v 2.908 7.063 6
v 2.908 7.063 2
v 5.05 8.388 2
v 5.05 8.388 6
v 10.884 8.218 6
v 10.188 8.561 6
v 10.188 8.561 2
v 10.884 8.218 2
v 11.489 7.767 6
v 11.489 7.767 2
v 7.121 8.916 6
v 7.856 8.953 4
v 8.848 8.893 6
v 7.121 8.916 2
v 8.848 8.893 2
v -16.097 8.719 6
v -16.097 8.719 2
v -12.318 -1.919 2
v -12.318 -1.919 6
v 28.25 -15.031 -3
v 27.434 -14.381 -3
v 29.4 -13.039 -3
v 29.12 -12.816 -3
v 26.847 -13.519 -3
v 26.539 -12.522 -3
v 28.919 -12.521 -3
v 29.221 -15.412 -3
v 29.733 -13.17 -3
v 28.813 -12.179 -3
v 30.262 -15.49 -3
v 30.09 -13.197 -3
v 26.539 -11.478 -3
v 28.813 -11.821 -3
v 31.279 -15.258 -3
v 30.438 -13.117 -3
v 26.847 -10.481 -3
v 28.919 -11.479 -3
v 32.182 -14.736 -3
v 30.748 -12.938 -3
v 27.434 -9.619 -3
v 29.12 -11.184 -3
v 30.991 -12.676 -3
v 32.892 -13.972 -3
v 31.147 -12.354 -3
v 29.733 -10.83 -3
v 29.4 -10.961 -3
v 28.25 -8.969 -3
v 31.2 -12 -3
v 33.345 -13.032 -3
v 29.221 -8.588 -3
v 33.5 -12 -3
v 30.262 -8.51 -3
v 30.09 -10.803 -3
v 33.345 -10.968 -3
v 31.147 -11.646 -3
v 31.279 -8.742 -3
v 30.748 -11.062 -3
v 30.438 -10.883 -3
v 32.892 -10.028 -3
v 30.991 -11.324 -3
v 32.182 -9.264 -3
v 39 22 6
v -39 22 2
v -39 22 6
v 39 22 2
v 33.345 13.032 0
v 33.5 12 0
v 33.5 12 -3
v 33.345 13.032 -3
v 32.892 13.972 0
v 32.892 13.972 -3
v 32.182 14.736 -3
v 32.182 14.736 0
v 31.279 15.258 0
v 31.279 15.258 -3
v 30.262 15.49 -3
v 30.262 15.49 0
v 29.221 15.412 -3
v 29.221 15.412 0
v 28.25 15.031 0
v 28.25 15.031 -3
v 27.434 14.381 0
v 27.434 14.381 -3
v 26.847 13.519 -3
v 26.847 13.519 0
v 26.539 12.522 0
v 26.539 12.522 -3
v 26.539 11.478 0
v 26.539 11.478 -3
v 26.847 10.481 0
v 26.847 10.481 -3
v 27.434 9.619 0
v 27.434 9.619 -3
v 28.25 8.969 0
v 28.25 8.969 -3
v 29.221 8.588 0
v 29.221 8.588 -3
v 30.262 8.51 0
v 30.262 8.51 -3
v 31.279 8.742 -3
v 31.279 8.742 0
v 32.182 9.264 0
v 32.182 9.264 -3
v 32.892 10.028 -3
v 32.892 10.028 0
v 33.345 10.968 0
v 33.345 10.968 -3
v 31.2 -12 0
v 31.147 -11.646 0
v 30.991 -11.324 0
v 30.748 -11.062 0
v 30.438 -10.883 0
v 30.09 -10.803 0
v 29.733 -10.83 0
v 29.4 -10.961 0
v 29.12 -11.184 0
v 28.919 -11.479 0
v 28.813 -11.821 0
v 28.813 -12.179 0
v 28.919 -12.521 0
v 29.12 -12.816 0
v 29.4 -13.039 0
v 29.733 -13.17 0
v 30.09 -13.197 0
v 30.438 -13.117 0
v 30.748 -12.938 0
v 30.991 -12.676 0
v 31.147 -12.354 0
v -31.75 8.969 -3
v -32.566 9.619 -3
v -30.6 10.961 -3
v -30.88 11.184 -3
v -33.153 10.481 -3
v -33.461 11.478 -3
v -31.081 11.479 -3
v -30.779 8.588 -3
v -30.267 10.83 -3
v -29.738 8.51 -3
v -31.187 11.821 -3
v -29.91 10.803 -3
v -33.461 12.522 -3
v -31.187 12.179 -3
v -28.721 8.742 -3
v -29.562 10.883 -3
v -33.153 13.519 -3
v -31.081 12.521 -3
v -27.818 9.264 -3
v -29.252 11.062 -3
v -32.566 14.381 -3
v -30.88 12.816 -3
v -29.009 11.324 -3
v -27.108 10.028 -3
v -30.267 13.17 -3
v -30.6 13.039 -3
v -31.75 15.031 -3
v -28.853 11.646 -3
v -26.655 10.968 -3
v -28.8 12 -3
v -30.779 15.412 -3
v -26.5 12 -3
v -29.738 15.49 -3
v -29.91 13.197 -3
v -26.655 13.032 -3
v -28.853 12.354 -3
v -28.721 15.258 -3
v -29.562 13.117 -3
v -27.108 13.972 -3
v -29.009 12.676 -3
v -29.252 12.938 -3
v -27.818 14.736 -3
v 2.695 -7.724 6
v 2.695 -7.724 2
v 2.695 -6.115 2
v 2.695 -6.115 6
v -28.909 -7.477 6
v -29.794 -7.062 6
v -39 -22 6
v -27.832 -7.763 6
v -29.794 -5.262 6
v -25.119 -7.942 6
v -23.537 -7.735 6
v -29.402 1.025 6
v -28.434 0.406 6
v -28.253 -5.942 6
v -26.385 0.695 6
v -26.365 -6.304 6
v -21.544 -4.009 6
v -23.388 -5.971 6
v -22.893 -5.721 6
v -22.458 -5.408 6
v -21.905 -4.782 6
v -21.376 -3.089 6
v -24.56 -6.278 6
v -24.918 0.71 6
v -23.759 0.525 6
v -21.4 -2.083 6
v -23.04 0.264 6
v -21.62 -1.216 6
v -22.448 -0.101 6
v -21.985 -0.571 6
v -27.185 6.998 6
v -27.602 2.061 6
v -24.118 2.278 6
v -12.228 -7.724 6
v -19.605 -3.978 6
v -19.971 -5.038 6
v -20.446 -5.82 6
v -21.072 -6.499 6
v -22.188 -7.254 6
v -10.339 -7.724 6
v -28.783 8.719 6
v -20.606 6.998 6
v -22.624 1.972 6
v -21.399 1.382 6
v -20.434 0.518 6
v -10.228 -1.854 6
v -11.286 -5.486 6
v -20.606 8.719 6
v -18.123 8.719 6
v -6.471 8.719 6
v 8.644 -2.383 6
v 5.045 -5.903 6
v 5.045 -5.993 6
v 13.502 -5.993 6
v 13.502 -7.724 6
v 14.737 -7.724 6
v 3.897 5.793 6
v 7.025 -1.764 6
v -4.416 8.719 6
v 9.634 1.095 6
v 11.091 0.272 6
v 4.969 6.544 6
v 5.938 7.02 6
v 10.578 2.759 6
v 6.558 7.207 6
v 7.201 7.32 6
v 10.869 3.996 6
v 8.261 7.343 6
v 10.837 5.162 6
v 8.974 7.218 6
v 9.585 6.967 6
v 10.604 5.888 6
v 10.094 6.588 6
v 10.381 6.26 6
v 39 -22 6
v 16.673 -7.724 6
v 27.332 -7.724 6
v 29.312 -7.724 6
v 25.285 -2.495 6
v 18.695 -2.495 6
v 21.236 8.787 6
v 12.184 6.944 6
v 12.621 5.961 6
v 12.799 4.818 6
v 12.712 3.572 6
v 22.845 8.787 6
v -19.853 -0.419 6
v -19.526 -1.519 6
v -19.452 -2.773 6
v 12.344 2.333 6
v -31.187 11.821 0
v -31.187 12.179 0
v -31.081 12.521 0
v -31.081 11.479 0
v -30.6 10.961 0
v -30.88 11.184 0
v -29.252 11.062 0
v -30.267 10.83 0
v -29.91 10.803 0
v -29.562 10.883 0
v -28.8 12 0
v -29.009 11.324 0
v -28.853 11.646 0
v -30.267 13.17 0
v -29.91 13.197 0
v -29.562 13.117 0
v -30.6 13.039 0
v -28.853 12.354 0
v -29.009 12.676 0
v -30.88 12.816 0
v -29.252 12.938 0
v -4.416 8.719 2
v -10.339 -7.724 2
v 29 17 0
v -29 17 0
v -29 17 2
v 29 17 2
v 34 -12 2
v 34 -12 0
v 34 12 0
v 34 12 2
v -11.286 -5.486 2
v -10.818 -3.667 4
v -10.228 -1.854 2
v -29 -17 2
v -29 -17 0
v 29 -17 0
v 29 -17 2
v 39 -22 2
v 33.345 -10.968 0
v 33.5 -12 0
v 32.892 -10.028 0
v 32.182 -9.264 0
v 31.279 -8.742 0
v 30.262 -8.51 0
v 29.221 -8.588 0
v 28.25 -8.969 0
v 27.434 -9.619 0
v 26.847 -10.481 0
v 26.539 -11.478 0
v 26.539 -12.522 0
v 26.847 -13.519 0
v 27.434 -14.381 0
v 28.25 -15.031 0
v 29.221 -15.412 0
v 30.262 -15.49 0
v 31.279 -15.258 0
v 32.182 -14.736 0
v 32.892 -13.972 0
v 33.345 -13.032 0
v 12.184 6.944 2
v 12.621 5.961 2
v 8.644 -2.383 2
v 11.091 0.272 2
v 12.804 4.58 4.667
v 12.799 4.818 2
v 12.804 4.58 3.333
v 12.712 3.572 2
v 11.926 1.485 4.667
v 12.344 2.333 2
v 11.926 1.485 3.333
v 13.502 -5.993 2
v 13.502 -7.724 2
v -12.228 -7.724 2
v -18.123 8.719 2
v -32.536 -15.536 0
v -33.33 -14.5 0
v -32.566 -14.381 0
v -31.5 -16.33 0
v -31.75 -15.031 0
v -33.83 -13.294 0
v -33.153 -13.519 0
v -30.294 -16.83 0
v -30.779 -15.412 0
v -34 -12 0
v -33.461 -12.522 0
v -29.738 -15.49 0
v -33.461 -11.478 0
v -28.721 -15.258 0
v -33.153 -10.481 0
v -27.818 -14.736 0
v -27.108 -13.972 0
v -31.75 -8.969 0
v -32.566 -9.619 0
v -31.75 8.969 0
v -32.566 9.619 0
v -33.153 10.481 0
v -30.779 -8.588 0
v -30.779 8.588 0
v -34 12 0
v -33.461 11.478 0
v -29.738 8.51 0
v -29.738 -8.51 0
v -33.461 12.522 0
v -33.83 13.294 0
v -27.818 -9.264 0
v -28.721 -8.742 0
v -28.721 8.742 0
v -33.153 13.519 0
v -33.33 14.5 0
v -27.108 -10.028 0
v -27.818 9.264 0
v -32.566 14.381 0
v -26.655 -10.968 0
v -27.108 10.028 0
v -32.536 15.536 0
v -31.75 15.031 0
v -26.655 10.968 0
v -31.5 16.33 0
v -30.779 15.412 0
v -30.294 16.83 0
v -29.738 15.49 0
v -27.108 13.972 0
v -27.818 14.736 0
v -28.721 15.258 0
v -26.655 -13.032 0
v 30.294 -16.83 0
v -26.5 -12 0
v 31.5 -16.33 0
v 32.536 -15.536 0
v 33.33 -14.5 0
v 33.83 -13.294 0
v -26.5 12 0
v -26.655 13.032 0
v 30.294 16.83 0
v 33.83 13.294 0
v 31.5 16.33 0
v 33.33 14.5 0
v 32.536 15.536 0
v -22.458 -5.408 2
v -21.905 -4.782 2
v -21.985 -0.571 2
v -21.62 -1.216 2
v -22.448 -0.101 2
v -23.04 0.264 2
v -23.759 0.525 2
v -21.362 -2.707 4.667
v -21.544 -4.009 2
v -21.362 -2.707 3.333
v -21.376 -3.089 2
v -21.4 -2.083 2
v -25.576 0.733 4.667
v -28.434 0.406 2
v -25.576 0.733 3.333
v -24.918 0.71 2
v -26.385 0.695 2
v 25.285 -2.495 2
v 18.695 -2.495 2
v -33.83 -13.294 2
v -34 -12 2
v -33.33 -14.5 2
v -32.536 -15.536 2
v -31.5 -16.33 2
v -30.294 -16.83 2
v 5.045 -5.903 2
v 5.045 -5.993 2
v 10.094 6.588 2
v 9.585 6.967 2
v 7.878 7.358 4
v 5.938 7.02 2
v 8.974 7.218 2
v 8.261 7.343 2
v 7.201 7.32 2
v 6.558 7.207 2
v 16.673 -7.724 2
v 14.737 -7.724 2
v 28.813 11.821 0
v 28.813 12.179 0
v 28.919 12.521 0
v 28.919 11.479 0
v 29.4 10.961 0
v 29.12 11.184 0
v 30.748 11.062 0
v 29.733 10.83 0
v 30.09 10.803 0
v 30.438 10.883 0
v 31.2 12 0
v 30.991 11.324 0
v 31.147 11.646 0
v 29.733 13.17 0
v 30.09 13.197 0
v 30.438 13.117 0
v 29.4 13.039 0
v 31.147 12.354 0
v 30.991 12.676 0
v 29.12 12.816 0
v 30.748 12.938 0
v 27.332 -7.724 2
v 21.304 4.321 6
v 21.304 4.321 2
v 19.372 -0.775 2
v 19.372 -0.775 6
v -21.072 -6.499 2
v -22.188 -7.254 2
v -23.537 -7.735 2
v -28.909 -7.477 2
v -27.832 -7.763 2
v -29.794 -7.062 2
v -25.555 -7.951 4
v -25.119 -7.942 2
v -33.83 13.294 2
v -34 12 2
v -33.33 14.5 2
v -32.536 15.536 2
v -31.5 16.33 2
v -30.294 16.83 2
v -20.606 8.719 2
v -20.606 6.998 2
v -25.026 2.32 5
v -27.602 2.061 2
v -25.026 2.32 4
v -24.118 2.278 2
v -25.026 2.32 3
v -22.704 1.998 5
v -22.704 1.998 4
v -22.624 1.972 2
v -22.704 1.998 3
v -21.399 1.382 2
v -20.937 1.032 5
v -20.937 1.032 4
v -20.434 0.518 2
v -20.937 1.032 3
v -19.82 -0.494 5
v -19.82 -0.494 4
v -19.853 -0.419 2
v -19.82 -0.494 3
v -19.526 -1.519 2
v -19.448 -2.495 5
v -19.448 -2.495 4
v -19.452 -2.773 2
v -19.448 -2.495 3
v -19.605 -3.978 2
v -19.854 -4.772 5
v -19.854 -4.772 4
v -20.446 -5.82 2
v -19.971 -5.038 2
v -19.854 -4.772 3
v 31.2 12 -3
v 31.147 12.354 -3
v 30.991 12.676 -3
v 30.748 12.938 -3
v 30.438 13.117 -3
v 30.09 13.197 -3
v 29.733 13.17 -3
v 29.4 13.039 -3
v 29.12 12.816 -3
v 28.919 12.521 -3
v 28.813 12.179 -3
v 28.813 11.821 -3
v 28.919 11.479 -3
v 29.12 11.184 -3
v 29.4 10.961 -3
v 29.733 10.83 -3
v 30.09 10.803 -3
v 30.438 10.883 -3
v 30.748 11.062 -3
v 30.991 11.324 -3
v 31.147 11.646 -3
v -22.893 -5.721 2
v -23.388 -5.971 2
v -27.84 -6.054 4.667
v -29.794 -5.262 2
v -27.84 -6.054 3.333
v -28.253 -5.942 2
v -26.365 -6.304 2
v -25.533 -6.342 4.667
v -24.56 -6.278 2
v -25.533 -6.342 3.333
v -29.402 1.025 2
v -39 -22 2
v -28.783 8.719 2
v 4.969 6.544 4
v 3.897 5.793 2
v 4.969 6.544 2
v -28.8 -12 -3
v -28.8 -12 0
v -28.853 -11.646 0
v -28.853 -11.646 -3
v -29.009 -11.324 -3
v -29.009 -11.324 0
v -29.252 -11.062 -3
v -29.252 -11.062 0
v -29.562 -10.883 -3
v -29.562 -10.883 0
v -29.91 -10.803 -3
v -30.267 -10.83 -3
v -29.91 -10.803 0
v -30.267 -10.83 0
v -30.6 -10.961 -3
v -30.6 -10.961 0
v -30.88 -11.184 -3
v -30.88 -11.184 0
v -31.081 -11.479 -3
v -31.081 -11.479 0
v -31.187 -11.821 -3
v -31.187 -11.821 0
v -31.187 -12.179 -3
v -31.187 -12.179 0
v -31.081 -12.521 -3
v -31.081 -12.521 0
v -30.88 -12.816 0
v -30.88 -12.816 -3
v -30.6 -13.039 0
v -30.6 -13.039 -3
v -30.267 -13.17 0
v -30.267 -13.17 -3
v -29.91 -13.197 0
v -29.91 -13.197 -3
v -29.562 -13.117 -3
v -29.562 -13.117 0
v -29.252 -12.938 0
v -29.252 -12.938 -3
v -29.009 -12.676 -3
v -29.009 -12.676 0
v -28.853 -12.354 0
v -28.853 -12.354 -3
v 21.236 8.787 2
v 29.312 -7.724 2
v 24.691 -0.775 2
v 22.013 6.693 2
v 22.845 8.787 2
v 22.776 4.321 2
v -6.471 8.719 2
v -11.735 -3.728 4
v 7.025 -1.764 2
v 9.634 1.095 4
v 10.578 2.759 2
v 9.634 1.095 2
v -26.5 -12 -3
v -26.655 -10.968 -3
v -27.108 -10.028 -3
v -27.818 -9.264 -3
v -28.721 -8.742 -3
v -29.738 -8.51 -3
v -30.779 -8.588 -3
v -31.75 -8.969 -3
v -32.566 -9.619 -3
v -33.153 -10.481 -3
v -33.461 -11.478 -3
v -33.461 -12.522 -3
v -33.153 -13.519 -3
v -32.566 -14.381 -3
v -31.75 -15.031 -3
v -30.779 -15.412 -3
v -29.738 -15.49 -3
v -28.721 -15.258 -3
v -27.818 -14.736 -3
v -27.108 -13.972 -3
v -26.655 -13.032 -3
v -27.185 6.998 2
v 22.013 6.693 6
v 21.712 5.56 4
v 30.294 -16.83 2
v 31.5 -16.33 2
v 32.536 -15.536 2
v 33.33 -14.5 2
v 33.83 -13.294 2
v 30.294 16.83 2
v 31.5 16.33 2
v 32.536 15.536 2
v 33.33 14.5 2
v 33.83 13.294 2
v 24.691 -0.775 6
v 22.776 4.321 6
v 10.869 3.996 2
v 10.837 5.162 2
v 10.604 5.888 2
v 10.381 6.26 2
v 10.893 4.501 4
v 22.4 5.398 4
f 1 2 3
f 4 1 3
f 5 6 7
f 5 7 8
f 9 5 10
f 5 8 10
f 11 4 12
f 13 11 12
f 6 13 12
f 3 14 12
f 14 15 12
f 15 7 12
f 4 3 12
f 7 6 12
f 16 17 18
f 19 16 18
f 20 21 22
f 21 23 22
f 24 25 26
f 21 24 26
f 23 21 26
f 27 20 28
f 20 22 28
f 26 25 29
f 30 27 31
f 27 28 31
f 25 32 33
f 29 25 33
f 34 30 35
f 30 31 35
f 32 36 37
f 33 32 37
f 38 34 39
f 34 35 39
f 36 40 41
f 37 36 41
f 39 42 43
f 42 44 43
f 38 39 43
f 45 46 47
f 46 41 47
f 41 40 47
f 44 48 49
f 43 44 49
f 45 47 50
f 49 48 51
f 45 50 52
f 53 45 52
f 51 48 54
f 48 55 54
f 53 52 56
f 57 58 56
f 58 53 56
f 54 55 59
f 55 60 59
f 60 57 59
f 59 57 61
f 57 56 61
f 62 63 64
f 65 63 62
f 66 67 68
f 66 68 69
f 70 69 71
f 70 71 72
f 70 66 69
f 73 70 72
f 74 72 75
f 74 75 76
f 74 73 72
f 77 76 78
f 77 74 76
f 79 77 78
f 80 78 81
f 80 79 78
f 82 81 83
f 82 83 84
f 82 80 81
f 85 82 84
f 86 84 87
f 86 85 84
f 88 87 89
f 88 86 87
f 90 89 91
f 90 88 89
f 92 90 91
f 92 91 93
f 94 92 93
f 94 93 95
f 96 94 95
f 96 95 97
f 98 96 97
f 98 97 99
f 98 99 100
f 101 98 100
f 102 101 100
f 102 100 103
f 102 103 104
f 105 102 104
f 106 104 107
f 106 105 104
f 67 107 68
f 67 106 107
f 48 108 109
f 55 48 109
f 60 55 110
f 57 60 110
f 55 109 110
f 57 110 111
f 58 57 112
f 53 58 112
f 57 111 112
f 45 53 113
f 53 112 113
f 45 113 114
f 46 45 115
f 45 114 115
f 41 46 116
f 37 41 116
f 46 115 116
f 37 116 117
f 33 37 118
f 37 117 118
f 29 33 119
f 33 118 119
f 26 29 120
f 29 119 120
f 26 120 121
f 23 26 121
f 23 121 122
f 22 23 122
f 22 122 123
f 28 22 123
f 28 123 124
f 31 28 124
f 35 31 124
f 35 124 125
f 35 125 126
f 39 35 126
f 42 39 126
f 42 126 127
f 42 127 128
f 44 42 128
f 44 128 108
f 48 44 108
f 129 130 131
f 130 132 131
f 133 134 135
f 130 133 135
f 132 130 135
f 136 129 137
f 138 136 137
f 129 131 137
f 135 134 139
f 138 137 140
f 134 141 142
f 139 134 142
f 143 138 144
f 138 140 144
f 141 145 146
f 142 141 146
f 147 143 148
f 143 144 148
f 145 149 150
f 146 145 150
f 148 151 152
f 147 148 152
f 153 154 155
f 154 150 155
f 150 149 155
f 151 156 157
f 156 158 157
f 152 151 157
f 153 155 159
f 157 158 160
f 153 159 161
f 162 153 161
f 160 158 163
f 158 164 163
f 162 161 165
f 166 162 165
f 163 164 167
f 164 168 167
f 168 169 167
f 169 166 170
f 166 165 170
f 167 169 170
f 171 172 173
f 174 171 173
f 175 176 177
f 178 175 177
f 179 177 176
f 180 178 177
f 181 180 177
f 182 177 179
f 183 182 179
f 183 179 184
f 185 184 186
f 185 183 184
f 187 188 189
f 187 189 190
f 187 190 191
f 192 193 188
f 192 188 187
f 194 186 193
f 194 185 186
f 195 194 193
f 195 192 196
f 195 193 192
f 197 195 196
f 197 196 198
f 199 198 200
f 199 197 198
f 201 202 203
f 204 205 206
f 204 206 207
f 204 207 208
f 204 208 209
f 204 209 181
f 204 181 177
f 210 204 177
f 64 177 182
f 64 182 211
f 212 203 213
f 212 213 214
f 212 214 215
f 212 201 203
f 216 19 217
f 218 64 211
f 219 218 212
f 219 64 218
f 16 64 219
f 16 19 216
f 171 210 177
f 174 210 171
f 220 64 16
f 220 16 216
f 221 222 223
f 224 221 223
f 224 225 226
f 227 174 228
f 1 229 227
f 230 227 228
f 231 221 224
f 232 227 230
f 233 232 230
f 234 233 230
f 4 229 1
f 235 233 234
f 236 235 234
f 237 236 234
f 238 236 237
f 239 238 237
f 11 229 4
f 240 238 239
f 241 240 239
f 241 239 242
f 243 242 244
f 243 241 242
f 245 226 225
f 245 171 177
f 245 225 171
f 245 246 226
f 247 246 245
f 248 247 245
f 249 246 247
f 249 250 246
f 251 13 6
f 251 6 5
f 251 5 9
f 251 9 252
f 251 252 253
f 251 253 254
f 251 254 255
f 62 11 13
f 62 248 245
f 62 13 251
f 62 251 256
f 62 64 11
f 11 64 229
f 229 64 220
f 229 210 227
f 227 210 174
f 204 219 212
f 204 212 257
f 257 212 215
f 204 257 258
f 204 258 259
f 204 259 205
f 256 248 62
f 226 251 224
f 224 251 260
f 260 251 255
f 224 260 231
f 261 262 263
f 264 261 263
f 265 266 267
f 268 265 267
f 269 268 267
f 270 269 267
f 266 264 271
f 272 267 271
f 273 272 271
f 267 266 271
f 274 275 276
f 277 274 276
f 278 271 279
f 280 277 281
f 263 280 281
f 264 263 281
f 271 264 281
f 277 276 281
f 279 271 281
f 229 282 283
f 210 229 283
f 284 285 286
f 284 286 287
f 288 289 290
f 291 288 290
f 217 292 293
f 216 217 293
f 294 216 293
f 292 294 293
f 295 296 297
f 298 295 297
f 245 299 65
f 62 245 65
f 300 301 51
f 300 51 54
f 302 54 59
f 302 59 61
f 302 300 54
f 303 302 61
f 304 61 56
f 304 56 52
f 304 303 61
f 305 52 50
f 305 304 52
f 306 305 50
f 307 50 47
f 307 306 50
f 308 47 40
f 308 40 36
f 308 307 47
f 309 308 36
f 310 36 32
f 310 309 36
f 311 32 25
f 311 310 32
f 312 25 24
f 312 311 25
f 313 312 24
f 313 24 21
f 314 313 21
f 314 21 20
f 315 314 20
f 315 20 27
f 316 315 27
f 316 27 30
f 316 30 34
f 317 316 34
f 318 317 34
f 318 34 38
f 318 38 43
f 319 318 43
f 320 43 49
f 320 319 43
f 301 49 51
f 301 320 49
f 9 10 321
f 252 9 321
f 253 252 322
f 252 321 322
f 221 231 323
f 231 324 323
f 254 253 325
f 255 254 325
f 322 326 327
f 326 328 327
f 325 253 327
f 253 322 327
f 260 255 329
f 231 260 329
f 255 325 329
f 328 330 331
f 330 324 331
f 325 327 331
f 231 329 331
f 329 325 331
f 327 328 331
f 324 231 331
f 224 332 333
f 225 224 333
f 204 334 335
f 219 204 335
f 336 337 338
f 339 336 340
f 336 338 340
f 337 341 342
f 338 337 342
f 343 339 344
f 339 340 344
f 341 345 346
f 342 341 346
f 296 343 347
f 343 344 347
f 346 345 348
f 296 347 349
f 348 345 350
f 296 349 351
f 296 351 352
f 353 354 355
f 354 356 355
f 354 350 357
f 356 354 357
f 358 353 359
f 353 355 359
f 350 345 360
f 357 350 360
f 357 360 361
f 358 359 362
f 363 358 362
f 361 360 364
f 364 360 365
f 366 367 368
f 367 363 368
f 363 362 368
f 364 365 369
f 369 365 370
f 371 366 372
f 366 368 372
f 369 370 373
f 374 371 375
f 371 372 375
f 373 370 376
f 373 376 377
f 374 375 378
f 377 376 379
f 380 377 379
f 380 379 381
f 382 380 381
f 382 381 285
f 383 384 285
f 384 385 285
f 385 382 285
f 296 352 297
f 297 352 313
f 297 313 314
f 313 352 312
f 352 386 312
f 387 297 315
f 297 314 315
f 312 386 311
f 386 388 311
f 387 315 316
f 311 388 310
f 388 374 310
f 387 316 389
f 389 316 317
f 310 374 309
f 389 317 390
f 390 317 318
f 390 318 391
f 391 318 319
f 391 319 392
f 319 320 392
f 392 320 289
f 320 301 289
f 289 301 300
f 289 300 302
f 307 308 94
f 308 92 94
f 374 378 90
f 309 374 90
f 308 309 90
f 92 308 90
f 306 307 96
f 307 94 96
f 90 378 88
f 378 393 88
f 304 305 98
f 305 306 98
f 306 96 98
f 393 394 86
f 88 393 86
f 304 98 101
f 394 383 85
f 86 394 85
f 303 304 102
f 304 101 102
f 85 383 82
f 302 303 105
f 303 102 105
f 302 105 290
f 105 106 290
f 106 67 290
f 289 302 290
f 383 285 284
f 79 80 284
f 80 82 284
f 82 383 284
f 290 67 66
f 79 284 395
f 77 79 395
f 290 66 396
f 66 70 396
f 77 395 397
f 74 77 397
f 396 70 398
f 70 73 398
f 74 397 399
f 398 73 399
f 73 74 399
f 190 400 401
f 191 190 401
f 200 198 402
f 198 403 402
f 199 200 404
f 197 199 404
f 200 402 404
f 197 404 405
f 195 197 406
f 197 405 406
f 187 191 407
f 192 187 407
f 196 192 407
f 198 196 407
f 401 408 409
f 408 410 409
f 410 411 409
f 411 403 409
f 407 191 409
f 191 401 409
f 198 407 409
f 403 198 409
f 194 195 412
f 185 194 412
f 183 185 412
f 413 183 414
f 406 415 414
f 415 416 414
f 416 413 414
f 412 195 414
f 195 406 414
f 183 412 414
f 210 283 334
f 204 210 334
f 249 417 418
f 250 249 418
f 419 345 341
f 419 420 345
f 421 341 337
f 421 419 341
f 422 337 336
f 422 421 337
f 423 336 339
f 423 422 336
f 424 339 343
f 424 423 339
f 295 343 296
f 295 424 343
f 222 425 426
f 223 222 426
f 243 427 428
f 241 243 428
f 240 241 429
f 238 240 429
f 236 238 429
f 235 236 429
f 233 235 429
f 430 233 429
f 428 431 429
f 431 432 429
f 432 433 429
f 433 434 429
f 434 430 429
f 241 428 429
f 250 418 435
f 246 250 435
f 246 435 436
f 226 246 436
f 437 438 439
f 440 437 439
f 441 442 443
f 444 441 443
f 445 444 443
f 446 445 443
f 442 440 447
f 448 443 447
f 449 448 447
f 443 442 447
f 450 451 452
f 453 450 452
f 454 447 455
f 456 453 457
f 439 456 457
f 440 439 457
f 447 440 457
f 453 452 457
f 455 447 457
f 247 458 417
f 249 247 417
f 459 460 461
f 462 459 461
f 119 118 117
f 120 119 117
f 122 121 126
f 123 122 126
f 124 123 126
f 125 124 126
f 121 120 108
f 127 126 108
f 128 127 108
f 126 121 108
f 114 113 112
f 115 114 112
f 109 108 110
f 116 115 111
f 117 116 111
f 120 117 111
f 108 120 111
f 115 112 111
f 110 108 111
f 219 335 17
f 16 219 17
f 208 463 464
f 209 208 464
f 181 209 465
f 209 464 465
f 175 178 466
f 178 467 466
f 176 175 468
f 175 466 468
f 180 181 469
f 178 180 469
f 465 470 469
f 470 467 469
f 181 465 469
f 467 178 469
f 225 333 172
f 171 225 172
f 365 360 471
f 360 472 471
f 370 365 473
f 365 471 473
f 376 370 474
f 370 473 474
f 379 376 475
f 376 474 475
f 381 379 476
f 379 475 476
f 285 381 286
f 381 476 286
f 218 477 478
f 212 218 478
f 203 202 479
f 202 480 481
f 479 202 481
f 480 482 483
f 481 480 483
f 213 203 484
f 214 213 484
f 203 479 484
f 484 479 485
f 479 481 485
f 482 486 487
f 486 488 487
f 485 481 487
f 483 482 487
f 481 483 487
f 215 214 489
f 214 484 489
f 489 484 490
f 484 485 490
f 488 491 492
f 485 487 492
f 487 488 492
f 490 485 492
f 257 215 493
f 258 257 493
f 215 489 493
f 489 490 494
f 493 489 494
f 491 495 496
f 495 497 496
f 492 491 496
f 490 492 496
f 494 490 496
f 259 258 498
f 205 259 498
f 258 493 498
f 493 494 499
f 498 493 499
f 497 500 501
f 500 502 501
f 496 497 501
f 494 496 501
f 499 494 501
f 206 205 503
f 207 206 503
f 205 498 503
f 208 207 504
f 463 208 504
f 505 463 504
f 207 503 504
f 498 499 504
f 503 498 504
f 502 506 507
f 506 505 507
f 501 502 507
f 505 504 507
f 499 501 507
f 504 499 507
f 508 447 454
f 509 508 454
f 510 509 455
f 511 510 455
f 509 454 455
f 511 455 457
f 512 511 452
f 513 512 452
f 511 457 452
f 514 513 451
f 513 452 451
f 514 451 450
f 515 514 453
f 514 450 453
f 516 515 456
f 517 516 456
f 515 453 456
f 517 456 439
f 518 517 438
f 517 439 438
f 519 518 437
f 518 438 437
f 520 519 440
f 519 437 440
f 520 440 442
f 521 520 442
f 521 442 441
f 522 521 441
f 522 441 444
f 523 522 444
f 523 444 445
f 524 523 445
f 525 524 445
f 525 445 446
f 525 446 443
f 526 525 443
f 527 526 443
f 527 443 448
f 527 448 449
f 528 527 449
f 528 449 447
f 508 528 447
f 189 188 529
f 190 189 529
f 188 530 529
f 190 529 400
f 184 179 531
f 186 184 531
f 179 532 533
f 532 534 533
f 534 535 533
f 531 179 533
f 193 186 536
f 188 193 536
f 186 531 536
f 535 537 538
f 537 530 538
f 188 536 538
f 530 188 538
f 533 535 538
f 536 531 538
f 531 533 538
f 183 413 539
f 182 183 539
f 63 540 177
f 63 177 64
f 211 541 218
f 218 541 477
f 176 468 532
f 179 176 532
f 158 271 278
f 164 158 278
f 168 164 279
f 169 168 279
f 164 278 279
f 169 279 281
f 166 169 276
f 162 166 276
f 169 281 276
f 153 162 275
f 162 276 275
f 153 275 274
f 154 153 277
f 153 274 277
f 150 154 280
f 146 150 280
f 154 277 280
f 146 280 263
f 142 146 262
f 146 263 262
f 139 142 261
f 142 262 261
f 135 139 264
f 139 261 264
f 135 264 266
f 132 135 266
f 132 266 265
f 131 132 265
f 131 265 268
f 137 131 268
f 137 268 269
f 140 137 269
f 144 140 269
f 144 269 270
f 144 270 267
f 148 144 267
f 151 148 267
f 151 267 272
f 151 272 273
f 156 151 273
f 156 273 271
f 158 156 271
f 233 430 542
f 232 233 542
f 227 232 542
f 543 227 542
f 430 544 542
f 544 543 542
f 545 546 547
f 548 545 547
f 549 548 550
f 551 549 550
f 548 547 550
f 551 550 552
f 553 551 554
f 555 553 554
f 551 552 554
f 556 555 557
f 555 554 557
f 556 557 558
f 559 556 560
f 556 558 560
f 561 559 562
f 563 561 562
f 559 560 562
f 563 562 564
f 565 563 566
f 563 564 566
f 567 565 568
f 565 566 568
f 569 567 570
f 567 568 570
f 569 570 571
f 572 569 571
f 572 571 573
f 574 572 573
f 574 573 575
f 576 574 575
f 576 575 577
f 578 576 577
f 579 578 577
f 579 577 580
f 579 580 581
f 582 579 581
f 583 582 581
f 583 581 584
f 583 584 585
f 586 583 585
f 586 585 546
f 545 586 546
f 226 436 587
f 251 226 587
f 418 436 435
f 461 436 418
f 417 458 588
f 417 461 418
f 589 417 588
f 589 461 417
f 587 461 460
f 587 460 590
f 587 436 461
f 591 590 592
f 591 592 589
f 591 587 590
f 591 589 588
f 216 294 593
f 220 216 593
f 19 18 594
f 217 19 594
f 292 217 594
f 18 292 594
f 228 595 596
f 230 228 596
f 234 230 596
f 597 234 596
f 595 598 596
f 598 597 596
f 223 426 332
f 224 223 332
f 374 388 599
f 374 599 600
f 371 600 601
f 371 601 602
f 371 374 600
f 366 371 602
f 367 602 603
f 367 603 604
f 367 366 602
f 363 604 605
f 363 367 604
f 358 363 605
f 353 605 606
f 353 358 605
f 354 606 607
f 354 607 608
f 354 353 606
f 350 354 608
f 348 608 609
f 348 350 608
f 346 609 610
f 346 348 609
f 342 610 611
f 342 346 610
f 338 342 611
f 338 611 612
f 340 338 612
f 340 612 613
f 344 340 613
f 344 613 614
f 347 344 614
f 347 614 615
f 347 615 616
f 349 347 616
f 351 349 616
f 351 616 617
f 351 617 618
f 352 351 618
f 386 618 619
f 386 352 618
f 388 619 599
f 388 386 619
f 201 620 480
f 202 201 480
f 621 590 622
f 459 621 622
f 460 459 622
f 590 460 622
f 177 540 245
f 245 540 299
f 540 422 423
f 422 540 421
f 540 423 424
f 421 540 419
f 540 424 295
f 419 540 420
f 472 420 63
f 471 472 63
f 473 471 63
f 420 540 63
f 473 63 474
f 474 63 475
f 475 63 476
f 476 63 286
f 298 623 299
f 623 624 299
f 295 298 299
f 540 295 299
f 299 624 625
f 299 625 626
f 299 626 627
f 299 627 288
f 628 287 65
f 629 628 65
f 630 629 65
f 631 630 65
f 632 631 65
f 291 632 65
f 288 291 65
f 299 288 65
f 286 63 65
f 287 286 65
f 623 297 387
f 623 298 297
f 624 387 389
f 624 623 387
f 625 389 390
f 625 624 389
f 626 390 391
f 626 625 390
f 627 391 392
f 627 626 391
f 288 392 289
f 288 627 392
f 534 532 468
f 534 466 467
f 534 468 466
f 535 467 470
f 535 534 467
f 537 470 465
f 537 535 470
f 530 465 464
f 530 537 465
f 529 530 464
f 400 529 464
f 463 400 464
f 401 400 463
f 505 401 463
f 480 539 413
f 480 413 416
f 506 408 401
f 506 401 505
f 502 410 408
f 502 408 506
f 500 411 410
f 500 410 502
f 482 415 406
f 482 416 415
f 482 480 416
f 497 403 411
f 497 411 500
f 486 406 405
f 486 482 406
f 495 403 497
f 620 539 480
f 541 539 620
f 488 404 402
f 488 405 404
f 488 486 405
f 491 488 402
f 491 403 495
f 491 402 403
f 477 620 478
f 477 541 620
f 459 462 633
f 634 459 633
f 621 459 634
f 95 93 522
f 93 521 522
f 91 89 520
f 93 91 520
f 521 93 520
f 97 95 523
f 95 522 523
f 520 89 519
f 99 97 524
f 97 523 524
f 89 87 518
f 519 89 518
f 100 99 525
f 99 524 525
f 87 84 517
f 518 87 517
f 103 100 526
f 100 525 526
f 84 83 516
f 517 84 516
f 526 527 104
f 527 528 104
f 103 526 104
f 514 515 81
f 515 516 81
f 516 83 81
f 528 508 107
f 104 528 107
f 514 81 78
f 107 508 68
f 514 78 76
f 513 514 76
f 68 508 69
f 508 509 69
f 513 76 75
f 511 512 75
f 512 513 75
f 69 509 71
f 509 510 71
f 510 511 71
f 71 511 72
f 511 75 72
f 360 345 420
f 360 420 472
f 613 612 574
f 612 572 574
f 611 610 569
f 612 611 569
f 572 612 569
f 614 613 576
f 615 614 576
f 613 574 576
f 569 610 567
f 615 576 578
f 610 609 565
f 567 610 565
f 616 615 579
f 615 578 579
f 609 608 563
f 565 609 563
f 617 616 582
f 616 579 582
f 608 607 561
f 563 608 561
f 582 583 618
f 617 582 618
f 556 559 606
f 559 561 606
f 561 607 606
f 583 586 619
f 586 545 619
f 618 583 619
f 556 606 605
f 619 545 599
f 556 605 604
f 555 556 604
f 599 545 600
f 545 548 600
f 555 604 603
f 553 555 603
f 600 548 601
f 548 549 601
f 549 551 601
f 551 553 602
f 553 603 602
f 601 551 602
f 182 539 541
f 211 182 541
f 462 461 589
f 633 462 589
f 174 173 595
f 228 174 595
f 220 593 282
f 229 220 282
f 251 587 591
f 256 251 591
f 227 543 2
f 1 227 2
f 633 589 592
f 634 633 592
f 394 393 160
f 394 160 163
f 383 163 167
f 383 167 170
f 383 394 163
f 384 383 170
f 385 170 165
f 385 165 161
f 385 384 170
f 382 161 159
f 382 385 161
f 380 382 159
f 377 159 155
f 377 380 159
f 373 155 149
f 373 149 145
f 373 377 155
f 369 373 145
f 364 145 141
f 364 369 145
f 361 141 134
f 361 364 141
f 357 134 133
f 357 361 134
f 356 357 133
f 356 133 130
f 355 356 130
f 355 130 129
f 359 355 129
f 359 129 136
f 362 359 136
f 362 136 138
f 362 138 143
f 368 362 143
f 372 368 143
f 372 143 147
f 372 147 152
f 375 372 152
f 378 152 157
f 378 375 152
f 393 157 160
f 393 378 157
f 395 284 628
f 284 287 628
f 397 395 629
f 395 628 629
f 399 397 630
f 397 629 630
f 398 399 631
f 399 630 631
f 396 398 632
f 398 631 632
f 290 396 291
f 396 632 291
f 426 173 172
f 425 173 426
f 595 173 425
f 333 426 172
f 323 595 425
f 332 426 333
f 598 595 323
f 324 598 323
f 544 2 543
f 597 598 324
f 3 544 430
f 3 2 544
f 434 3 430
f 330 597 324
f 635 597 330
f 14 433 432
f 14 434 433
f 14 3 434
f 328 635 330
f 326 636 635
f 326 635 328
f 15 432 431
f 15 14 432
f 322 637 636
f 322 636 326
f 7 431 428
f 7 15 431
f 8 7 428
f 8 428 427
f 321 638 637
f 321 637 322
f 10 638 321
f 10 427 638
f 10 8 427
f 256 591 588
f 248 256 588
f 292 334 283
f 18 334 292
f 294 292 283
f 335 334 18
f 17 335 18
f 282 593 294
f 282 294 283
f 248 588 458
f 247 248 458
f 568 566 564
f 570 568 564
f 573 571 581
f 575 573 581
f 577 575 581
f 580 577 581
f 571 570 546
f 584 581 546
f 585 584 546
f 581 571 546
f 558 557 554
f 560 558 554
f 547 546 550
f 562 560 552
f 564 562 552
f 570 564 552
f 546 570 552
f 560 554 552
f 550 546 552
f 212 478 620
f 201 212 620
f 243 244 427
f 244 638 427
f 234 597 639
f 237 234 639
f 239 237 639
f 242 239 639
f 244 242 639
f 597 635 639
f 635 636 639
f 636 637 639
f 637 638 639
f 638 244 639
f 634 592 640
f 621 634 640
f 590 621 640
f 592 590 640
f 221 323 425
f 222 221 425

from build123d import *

# Parameters (mm, degrees)
F0_W     = 68
F0_H     = 34
F1_DEPTH = 2
F2_R     = 3.5
F3_DEPTH = 3
F4_D     = 2.4
F4_DEPTH = 3.001
F5_R     = 5
F6_W     = 78
F6_H     = 44
F7_DEPTH = 4


with BuildPart() as f1:
    # F0 (on Top) → F1 (new body)
    with BuildSketch(Plane.XY):
        Rectangle(F0_W, F0_H)
    extrude(amount=F1_DEPTH)

    # F2 (on face) → F3 (join)
    with BuildSketch(Plane.XY):
        with Locations((30, -12)):
            Circle(F2_R)
        with Locations((-30, -12)):
            Circle(F2_R)
        with Locations((30, 12)):
            Circle(F2_R)
        with Locations((-30, 12)):
            Circle(F2_R)
    extrude(amount=-F3_DEPTH)

    # F4 (through all, one way)
    with BuildSketch(Plane.XY):
        with Locations((-30, 12), (-30, -12), (30, 12), (30, -12)):
            Circle(F4_D / 2)
    extrude(amount=-F4_DEPTH, mode=Mode.SUBTRACT)

    # F5
    f5_edges = [f1.edges().sort_by_distance(p)[0] for p in [
        (-34, 17, 1),
        (34, 17, 1),
        (34, -17, 1),
        (-34, -17, 1),
    ]]
    fillet(f5_edges, radius=F5_R)

    # F6 (on face) → F7 (join)
    with BuildSketch(Plane.XY.offset(2)):
        Rectangle(F6_W, F6_H)
        with BuildLine():
            add(Edge.make_bspline(
                [(-27.6022215205, 2.0609542791), (-26.3102811263, 2.3200621019), (-25.0255381717, 2.3200621019)],
                knots=[0, 0, 0, 1, 1, 1], degree=2))
            add(Edge.make_bspline(
                [(-25.0255381717, 2.3200621019), (-22.4272625043, 2.3200621019), (-20.9373925233, 1.0317204275)],
                knots=[0, 0, 0, 1, 1, 1], degree=2))
            add(Edge.make_bspline(
                [(-20.9373925233, 1.0317204275), (-19.4475225423, -0.2566212469), (-19.4475225423, -2.4950249382)],
                knots=[0, 0, 0, 1, 1, 1], degree=2))
            add(Edge.make_bspline(
                [(-19.4475225423, -2.4950249382), (-19.4475225423, -5.0465172487), (-21.0723445143, -6.4986006722)],
                knots=[0, 0, 0, 1, 1, 1], degree=2))
            add(Edge.make_bspline(
                [(-21.0723445143, -6.4986006722), (-22.6971664864, -7.9506840957), (-25.5545499765, -7.9506840957)],
                knots=[0, 0, 0, 1, 1, 1], degree=2))
            add(Edge.make_bspline(
                [(-25.5545499765, -7.9506840957), (-28.3327616319, -7.9506840957), (-29.7938418549, -7.0618003148)],
                knots=[0, 0, 0, 1, 1, 1], degree=2))
            Line((-29.7938418549, -7.0618003148), (-29.7938418549, -5.2624404343))
            add(Edge.make_bspline(
                [(-29.7938418549, -5.2624404343), (-29.009320947, -5.7662612008), (-27.8397370247, -6.0541587817)],
                knots=[0, 0, 0, 1, 1, 1], degree=2))
            add(Edge.make_bspline(
                [(-27.8397370247, -6.0541587817), (-26.6701531024, -6.3420563626), (-25.532957658, -6.3420563626)],
                knots=[0, 0, 0, 1, 1, 1], degree=2))
            add(Edge.make_bspline(
                [(-25.532957658, -6.3420563626), (-23.5536617895, -6.3420563626), (-22.4578516223, -5.4081885846)],
                knots=[0, 0, 0, 1, 1, 1], degree=2))
            add(Edge.make_bspline(
                [(-22.4578516223, -5.4081885846), (-21.3620414551, -4.4743208067), (-21.3620414551, -2.7073494041)],
                knots=[0, 0, 0, 1, 1, 1], degree=2))
            add(Edge.make_bspline(
                [(-21.3620414551, -2.7073494041), (-21.3620414551, 0.7330266874), (-25.5761422951, 0.7330266874)],
                knots=[0, 0, 0, 1, 1, 1], degree=2))
            add(Edge.make_bspline(
                [(-25.5761422951, 0.7330266874), (-26.6449620641, 0.7330266874), (-28.4335257853, 0.4055431891)],
                knots=[0, 0, 0, 1, 1, 1], degree=2))
            Line((-28.4335257853, 0.4055431891), (-29.4015814009, 1.024522988))
            Line((-29.4015814009, 1.024522988), (-28.7826016021, 8.7185858368))
            Line((-28.7826016021, 8.7185858368), (-20.6063103053, 8.7185858368))
            Line((-20.6063103053, 8.7185858368), (-20.6063103053, 6.9983977911))
            Line((-20.6063103053, 6.9983977911), (-27.1847700282, 6.9983977911))
            Line((-27.1847700282, 6.9983977911), (-27.6022215205, 2.0609542791))
        make_face(mode=Mode.SUBTRACT)
        with BuildLine():
            Line((-10.2276025148, -1.8544528207), (-6.4705390845, 8.7185858368))
            Line((-6.4705390845, 8.7185858368), (-4.415670101, 8.7185858368))
            Line((-4.415670101, 8.7185858368), (-10.3391628274, -7.7239647508))
            Line((-10.3391628274, -7.7239647508), (-12.2284907019, -7.7239647508))
            Line((-12.2284907019, -7.7239647508), (-18.1231936703, 8.7185858368))
            Line((-18.1231936703, 8.7185858368), (-16.0971144449, 8.7185858368))
            Line((-16.0971144449, 8.7185858368), (-12.3184586959, -1.9192297764))
            add(Edge.make_bspline(
                [(-12.3184586959, -1.9192297764), (-11.6670904192, -3.7545768545), (-11.2856261245, -5.4855610595)],
                knots=[0, 0, 0, 1, 1, 1], degree=2))
            add(Edge.make_bspline(
                [(-11.2856261245, -5.4855610595), (-10.8789707916, -3.6646088605), (-10.2276025148, -1.8544528207)],
                knots=[0, 0, 0, 1, 1, 1], degree=2))
        make_face(mode=Mode.SUBTRACT)
        with BuildLine():
            Line((13.5023555886, -5.9929805458), (13.5023555886, -7.7239647508))
            Line((13.5023555886, -7.7239647508), (2.6954001466, -7.7239647508))
            Line((2.6954001466, -7.7239647508), (2.6954001466, -6.1153370176))
            Line((2.6954001466, -6.1153370176), (7.0246600189, -1.7644848267))
            add(Edge.make_bspline(
                [(7.0246600189, -1.7644848267), (9.0039558874, 0.2400020801), (9.6337318456, 1.0946980233)],
                knots=[0, 0, 0, 1, 1, 1], degree=2))
            add(Edge.make_bspline(
                [(9.6337318456, 1.0946980233), (10.2635078038, 1.9493939665), (10.5783957828, 2.7591059127)],
                knots=[0, 0, 0, 1, 1, 1], degree=2))
            add(Edge.make_bspline(
                [(10.5783957828, 2.7591059127), (10.8932837619, 3.568817859), (10.8932837619, 4.500886277)],
                knots=[0, 0, 0, 1, 1, 1], degree=2))
            add(Edge.make_bspline(
                [(10.8932837619, 4.500886277), (10.8932837619, 5.8180177095), (10.094367975, 6.5881437384)],
                knots=[0, 0, 0, 1, 1, 1], degree=2))
            add(Edge.make_bspline(
                [(10.094367975, 6.5881437384), (9.2954521881, 7.3582697672), (7.8775566023, 7.3582697672)],
                knots=[0, 0, 0, 1, 1, 1], degree=2))
            add(Edge.make_bspline(
                [(7.8775566023, 7.3582697672), (6.8555201902, 7.3582697672), (5.9378466511, 7.0199901097)],
                knots=[0, 0, 0, 1, 1, 1], degree=2))
            add(Edge.make_bspline(
                [(5.9378466511, 7.0199901097), (5.0201731121, 6.6817104521), (3.8973725467, 5.7928266712)],
                knots=[0, 0, 0, 1, 1, 1], degree=2))
            Line((3.8973725467, 5.7928266712), (2.9077246125, 7.0631747468))
            add(Edge.make_bspline(
                [(2.9077246125, 7.0631747468), (5.1785167816, 8.9525026213), (7.8559642837, 8.9525026213)],
                knots=[0, 0, 0, 1, 1, 1], degree=2))
            add(Edge.make_bspline(
                [(7.8559642837, 8.9525026213), (10.1735398097, 8.9525026213), (11.4888718823, 7.76672446)],
                knots=[0, 0, 0, 1, 1, 1], degree=2))
            add(Edge.make_bspline(
                [(11.4888718823, 7.76672446), (12.804203955, 6.5809462988), (12.804203955, 4.5800581118)],
                knots=[0, 0, 0, 1, 1, 1], degree=2))
            add(Edge.make_bspline(
                [(12.804203955, 4.5800581118), (12.804203955, 3.0146150158), (11.9261163333, 1.4851591174)],
                knots=[0, 0, 0, 1, 1, 1], degree=2))
            add(Edge.make_bspline(
                [(11.9261163333, 1.4851591174), (11.0480287116, -0.044296781), (8.6440839113, -2.3834646256)],
                knots=[0, 0, 0, 1, 1, 1], degree=2))
            Line((8.6440839113, -2.3834646256), (5.0453641504, -5.9030125517))
            Line((5.0453641504, -5.9030125517), (5.0453641504, -5.9929805458))
            Line((5.0453641504, -5.9929805458), (13.5023555886, -5.9929805458))
        make_face(mode=Mode.SUBTRACT)
        Polygon((29.3115314982, -7.7239647508), (27.3322356297, -7.7239647508), (25.2845640858, -2.4950249382), (18.6953082036, -2.4950249382), (16.6728276979, -7.7239647508), (14.7367164666, -7.7239647508), (21.2360043548, 8.7869615123), (22.8446320879, 8.7869615123), align=None, mode=Mode.SUBTRACT)
        with BuildLine():
            Line((19.3718675186, -0.7748368925), (24.6907753252, -0.7748368925))
            Line((24.6907753252, -0.7748368925), (22.7762564124, 4.320950289))
            add(Edge.make_bspline(
                [(22.7762564124, 4.320950289), (22.405588277, 5.2890059047), (22.0133278231, 6.6925066114)],
                knots=[0, 0, 0, 1, 1, 1], degree=2))
            add(Edge.make_bspline(
                [(22.0133278231, 6.6925066114), (21.7650161596, 5.6128906831), (21.3043800302, 4.320950289)],
                knots=[0, 0, 0, 1, 1, 1], degree=2))
            Line((21.3043800302, 4.320950289), (19.3718675186, -0.7748368925))
        make_face()
    extrude(amount=F7_DEPTH)


solid = f1.part
